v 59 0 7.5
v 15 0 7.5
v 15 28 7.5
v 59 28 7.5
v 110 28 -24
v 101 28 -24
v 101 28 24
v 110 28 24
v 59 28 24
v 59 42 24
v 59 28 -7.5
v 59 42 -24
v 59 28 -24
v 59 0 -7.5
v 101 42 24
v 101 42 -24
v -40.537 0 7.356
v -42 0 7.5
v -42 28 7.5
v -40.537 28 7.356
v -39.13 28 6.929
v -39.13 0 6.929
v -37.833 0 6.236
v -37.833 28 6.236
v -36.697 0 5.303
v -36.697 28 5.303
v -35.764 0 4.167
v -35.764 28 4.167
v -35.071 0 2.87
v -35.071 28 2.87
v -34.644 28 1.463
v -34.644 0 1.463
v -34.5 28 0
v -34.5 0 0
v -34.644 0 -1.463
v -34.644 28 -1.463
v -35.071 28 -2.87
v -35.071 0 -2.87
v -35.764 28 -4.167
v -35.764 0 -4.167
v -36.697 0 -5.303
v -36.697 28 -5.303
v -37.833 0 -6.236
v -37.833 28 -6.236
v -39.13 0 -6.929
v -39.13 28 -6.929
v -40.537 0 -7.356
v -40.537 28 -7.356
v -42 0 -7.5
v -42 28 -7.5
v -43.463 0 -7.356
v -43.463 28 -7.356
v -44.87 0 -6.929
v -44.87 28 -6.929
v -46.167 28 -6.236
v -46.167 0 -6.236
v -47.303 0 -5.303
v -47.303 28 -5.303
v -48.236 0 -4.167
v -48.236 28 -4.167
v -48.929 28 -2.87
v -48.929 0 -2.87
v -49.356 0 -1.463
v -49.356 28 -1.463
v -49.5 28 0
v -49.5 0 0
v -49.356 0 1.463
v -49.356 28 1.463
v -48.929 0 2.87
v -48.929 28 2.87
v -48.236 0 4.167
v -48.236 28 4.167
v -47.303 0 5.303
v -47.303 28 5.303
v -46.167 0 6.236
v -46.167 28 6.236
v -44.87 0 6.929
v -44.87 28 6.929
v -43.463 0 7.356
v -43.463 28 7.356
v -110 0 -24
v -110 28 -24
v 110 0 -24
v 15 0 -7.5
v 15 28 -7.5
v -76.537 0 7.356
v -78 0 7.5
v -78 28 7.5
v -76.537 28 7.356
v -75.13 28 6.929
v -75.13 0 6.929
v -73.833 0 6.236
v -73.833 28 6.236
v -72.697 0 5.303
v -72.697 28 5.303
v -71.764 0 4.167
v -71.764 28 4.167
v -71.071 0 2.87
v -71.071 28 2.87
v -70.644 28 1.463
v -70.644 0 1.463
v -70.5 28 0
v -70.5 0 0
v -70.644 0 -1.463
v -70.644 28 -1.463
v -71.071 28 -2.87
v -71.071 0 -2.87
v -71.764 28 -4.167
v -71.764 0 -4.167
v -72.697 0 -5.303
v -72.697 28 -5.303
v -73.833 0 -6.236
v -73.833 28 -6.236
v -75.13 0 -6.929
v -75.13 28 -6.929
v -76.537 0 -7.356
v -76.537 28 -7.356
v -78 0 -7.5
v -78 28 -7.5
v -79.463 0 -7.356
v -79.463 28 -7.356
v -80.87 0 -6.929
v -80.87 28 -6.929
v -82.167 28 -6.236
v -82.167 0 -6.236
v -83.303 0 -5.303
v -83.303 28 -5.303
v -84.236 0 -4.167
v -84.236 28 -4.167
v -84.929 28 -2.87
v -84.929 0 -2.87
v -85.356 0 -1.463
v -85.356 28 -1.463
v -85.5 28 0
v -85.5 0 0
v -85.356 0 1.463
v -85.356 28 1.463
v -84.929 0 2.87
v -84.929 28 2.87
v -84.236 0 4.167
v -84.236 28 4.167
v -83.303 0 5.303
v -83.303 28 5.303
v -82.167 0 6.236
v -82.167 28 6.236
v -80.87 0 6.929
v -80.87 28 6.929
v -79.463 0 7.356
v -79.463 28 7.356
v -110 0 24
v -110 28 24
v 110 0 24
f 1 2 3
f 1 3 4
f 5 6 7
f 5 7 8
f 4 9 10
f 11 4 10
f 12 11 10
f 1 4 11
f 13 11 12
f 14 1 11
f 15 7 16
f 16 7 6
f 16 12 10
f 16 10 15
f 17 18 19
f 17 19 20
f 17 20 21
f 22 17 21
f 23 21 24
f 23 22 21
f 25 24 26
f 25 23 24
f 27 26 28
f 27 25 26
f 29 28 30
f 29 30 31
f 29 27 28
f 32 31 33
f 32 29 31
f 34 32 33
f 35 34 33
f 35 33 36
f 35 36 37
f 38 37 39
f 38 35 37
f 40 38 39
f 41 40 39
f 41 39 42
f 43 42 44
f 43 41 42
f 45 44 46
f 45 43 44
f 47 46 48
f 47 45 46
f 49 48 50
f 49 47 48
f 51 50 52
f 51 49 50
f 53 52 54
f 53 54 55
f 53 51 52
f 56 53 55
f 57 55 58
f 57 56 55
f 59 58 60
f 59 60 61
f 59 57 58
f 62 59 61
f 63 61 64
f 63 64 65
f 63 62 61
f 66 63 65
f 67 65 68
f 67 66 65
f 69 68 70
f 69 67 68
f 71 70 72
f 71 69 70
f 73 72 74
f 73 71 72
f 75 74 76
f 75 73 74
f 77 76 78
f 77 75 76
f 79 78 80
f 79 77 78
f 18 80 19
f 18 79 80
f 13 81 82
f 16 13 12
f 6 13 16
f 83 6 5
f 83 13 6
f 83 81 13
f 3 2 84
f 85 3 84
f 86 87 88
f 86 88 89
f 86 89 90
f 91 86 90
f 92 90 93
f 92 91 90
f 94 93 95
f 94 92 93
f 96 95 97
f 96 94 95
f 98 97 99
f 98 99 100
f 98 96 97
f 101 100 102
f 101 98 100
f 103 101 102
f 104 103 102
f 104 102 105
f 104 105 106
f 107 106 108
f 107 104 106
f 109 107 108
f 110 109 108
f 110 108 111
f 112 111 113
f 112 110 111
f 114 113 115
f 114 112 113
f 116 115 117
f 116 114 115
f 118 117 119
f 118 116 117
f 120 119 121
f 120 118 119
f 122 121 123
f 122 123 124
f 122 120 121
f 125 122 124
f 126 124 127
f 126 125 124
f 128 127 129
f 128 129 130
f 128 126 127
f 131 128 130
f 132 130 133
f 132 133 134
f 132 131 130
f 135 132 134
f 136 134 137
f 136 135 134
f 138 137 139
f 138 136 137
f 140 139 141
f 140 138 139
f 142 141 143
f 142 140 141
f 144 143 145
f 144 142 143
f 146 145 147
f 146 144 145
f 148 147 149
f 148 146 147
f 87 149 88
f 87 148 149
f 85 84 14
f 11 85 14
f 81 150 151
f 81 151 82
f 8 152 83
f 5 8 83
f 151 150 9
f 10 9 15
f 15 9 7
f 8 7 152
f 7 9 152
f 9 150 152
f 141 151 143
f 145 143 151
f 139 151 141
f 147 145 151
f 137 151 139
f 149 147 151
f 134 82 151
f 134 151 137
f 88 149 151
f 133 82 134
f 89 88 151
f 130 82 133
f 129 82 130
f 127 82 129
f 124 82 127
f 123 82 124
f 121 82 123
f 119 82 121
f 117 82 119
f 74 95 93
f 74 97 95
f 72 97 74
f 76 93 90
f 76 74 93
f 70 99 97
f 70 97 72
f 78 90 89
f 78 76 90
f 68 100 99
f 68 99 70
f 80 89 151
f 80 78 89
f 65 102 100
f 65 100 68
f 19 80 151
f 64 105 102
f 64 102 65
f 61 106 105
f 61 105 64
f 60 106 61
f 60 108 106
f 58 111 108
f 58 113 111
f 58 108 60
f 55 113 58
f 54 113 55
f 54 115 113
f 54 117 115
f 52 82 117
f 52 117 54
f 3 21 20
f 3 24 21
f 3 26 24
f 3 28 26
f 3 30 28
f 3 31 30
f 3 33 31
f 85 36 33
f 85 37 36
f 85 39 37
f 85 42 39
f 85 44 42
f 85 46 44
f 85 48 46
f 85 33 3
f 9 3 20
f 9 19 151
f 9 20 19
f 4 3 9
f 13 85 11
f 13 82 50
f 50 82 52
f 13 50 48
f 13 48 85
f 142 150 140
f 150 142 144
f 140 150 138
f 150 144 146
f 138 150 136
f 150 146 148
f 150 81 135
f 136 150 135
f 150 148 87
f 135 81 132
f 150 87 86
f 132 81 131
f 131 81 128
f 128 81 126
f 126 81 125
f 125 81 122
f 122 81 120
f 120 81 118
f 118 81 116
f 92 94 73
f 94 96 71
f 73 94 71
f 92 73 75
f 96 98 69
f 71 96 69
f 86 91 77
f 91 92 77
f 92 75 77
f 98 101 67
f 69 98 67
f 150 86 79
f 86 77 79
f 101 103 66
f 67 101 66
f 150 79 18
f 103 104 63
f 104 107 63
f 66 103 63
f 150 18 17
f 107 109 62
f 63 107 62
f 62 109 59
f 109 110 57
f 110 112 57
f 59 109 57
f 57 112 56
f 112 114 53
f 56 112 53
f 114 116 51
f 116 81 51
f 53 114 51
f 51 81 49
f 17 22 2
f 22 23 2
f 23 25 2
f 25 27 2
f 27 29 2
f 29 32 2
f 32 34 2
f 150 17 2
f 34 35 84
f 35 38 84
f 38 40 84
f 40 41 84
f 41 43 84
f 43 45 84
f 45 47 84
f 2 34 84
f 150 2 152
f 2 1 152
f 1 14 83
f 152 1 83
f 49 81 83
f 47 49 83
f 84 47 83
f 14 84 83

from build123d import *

# Parameters (mm, degrees)
F_01_BASE_PROFILE_W           = 220
F_01_BASE_PROFILE_H           = 48
F_01_BASE_PROFILE_R           = 7.5
F_01_BASE_PROFILE_W_2         = 60
F_01_BASE_PROFILE_H_2         = 15
F_01_BASE_EXTRUDE_DEPTH       = 28
F_02_BOSS_PROFILE_W           = 42
F_02_BOSS_PROFILE_H           = 48
F_02_REINFORCEMENT_BOSS_DEPTH = 42


with BuildPart() as part:
    # 01_Base_Profile → 01_Base_Extrude (new body)
    with BuildSketch(Plane(origin=(0, 0, 0), x_dir=(1, 0, 0), z_dir=(0, 1, 0))):
        Rectangle(F_01_BASE_PROFILE_W, F_01_BASE_PROFILE_H)
        with Locations(Location((-78, 0, 0), (0, 0, 270))):
            Circle(F_01_BASE_PROFILE_R, mode=Mode.SUBTRACT)
        with Locations(Location((-42, 0, 0), (0, 0, 270))):
            Circle(F_01_BASE_PROFILE_R, mode=Mode.SUBTRACT)
        with Locations((45, 0)):
            Rectangle(F_01_BASE_PROFILE_W_2, F_01_BASE_PROFILE_H_2, mode=Mode.SUBTRACT)
    extrude(amount=F_01_BASE_EXTRUDE_DEPTH)

    # 02_Boss_Profile → 02_Reinforcement_Boss (add)
    with BuildSketch(Plane(origin=(0, 0, 0), x_dir=(1, 0, 0), z_dir=(0, 1, 0))):
        with Locations((80, 0)):
            Rectangle(F_02_BOSS_PROFILE_W, F_02_BOSS_PROFILE_H)
    extrude(amount=F_02_REINFORCEMENT_BOSS_DEPTH)


solid = part.part
